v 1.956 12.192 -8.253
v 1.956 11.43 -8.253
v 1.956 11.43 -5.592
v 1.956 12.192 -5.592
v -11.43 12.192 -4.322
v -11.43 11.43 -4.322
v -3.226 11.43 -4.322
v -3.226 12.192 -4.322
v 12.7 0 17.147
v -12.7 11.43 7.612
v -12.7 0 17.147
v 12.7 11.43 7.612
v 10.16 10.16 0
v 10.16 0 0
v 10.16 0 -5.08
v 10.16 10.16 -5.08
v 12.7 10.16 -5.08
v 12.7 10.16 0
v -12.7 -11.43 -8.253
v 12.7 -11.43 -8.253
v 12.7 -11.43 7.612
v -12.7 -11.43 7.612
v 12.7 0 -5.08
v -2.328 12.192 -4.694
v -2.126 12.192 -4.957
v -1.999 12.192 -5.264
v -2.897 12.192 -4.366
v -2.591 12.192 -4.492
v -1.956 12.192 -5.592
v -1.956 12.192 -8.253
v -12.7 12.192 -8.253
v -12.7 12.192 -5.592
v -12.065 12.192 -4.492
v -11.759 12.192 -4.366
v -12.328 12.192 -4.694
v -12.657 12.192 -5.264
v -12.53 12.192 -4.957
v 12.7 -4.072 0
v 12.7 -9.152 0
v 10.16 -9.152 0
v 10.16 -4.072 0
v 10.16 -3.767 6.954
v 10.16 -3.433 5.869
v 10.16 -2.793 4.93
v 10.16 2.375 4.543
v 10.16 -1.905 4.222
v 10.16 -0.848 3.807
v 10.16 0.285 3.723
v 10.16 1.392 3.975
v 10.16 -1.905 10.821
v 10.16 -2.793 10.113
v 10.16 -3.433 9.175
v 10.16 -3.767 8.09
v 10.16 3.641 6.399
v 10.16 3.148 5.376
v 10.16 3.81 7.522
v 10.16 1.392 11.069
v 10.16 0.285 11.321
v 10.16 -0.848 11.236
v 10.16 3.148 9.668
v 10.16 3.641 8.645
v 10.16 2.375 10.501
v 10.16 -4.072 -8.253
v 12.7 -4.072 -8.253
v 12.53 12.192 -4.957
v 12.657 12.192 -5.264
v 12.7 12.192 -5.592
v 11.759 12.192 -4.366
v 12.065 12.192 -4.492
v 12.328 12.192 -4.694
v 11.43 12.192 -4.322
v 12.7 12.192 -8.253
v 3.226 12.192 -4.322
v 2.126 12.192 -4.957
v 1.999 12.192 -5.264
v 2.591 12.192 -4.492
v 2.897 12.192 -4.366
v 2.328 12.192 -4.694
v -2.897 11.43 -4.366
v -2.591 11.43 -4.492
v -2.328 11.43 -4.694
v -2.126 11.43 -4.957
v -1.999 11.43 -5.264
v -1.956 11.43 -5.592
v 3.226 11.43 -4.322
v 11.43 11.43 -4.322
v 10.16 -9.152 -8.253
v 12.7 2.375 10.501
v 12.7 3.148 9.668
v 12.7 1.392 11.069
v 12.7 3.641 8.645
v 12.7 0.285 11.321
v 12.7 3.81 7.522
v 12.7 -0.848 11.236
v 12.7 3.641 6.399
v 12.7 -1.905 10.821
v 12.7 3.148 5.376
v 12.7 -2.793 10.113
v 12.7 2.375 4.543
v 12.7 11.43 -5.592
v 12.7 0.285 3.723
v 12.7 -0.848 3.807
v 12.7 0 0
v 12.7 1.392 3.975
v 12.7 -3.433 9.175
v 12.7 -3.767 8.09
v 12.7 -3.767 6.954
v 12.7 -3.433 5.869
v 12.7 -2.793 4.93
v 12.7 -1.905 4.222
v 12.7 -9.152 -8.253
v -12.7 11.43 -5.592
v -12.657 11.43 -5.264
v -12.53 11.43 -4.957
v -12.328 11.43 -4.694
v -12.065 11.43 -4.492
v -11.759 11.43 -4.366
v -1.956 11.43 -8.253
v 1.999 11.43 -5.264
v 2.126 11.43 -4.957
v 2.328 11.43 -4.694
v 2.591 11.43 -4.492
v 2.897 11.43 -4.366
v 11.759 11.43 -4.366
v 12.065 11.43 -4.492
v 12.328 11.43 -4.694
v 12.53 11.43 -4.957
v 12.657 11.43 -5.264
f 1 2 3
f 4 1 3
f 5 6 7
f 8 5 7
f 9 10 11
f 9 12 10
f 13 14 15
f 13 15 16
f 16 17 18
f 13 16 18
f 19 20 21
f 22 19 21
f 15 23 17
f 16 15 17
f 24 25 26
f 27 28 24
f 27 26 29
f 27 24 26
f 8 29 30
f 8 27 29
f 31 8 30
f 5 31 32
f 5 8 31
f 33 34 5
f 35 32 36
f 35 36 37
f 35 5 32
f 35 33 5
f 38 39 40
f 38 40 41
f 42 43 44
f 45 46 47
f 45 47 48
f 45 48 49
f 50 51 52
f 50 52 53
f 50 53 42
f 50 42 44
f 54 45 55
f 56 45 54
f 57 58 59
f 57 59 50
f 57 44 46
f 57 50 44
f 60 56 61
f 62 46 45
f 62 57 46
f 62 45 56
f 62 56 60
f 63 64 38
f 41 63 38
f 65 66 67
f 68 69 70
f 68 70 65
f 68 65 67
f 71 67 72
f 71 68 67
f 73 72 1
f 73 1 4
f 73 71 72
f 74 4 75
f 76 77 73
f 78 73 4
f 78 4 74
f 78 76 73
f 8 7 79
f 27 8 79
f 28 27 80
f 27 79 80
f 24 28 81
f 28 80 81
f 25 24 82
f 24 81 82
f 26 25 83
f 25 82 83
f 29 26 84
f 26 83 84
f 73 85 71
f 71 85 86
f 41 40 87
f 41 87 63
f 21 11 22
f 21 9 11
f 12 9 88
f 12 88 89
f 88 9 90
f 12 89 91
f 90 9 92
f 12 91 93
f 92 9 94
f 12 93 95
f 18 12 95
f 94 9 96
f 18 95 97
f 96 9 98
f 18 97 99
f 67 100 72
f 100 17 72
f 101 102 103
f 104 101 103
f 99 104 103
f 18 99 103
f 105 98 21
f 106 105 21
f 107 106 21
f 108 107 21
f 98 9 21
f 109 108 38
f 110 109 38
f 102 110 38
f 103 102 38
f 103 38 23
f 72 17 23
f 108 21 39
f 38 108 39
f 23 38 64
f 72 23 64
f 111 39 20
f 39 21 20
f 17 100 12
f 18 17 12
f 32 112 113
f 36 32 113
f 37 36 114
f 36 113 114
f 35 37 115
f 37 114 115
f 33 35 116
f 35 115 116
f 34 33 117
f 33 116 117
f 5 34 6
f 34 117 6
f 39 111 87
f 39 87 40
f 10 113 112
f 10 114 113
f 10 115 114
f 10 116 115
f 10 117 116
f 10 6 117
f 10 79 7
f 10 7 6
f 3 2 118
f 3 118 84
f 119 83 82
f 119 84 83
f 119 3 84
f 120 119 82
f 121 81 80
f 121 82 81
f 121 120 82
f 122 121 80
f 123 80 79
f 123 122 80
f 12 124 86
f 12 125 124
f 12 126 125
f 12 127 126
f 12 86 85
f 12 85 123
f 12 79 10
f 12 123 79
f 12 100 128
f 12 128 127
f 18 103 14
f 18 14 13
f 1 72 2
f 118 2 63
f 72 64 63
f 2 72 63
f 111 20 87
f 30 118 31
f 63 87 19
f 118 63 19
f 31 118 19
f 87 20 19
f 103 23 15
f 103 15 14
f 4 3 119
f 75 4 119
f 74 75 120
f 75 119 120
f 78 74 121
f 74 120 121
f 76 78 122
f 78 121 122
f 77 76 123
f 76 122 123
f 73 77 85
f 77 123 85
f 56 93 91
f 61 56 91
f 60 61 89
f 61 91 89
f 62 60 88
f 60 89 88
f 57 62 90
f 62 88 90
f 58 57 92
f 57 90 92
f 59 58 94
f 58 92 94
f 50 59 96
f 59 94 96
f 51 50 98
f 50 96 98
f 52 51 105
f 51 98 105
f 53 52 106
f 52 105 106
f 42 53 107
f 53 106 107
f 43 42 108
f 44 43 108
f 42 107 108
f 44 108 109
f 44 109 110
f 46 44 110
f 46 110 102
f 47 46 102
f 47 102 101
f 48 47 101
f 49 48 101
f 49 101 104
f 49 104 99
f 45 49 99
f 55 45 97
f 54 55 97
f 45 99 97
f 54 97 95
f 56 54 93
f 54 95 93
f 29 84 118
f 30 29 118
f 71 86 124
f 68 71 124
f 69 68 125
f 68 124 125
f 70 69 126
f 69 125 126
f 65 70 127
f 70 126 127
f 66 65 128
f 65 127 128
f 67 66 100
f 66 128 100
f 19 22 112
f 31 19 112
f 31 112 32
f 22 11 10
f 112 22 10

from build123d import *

# Parameters (mm, degrees)
F0_W     = 22.86
F0_H     = 15.864736
F1_DEPTH = 12.7
F2_W     = 5.08
F2_H     = 8.253078
F2_W_2   = 10.16
F2_H_2   = 5.08
F2_R     = 3.81
F3_DEPTH = 2.54
F5_DEPTH = 0.762


with BuildPart() as f1:
    # F0 (on Right) → F1 (new body, symmetric)
    with BuildSketch(Plane.YZ):
        Polygon((0, 17.146922), (-11.43, 7.611658), (11.43, 7.611658), align=None)
        with Locations((0, -0.32071)):
            Rectangle(F0_W, F0_H)
    extrude(amount=F1_DEPTH, both=True)

    # F2 (on face) → F3 (cut)
    with BuildSketch(Plane.YZ.offset(12.7)):
        with Locations((-6.611706, -4.126539)):
            Rectangle(F2_W, F2_H)
        with Locations((5.08, -2.54)):
            Rectangle(F2_W_2, F2_H_2)
        with Locations((0, 7.521919)):
            Circle(F2_R)
    extrude(amount=-F3_DEPTH, mode=Mode.SUBTRACT)

    # F4 (on face) → F5 (join)
    with BuildSketch(Plane(origin=(0, 11.43, 0), x_dir=(-1, 0, 0), z_dir=(0, 1, 0))):
        with BuildLine():
            Line((-5.059074, -4.322298), (-11.43, -4.322298))
            ThreePointArc((-11.43, -4.322298), (-12.328026, -4.694272), (-12.7, -5.592298))
            Line((-12.7, -5.592298), (-12.7, -8.253078))
            Line((-12.7, -8.253078), (-6.329074, -8.253078))
            Line((-6.329074, -8.253078), (-6.329074, -5.592298))
            ThreePointArc((-6.329074, -5.592298), (-5.9571, -4.694272), (-5.059074, -4.322298))
        make_face()
        with BuildLine():
            Line((-3.246726, -4.322298), (-5.059074, -4.322298))
            ThreePointArc((-5.059074, -4.322298), (-5.9571, -4.694272), (-6.329074, -5.592298))
            Line((-6.329074, -5.592298), (-6.329074, -8.253078))
            Line((-6.329074, -8.253078), (-1.976726, -8.253078))
            Line((-1.976726, -8.253078), (-1.976726, -5.592298))
            ThreePointArc((-1.976726, -5.592298), (-2.3487, -4.694272), (-3.246726, -4.322298))
        make_face()
        with BuildLine():
            Line((-3.2258, -4.322298), (-3.246726, -4.322298))
            ThreePointArc((-3.246726, -4.322298), (-2.3487, -4.694272), (-1.976726, -5.592298))
            Line((-1.976726, -5.592298), (-1.976726, -8.253078))
            Line((-1.976726, -8.253078), (-1.9558, -8.253078))
            Line((-1.9558, -8.253078), (-1.9558, -5.592298))
            ThreePointArc((-1.9558, -5.592298), (-2.327774, -4.694272), (-3.2258, -4.322298))
        make_face()
        with BuildLine():
            Line((3.246726, -4.322298), (3.2258, -4.322298))
            ThreePointArc((3.2258, -4.322298), (2.327774, -4.694272), (1.9558, -5.592298))
            Line((1.9558, -5.592298), (1.9558, -8.253078))
            Line((1.9558, -8.253078), (1.976726, -8.253078))
            Line((1.976726, -8.253078), (1.976726, -5.592298))
            ThreePointArc((1.976726, -5.592298), (2.3487, -4.694272), (3.246726, -4.322298))
        make_face()
        with BuildLine():
            Line((5.059074, -4.322298), (3.246726, -4.322298))
            ThreePointArc((3.246726, -4.322298), (2.3487, -4.694272), (1.976726, -5.592298))
            Line((1.976726, -5.592298), (1.976726, -8.253078))
            Line((1.976726, -8.253078), (6.329074, -8.253078))
            Line((6.329074, -8.253078), (6.329074, -5.592298))
            ThreePointArc((6.329074, -5.592298), (5.9571, -4.694272), (5.059074, -4.322298))
        make_face()
        with BuildLine():
            Line((11.43, -4.322298), (5.059074, -4.322298))
            ThreePointArc((5.059074, -4.322298), (5.9571, -4.694272), (6.329074, -5.592298))
            Line((6.329074, -5.592298), (6.329074, -8.253078))
            Line((6.329074, -8.253078), (12.7, -8.253078))
            Line((12.7, -8.253078), (12.7, -5.592298))
            ThreePointArc((12.7, -5.592298), (12.328026, -4.694272), (11.43, -4.322298))
        make_face()
    extrude(amount=F5_DEPTH)


solid = f1.part
